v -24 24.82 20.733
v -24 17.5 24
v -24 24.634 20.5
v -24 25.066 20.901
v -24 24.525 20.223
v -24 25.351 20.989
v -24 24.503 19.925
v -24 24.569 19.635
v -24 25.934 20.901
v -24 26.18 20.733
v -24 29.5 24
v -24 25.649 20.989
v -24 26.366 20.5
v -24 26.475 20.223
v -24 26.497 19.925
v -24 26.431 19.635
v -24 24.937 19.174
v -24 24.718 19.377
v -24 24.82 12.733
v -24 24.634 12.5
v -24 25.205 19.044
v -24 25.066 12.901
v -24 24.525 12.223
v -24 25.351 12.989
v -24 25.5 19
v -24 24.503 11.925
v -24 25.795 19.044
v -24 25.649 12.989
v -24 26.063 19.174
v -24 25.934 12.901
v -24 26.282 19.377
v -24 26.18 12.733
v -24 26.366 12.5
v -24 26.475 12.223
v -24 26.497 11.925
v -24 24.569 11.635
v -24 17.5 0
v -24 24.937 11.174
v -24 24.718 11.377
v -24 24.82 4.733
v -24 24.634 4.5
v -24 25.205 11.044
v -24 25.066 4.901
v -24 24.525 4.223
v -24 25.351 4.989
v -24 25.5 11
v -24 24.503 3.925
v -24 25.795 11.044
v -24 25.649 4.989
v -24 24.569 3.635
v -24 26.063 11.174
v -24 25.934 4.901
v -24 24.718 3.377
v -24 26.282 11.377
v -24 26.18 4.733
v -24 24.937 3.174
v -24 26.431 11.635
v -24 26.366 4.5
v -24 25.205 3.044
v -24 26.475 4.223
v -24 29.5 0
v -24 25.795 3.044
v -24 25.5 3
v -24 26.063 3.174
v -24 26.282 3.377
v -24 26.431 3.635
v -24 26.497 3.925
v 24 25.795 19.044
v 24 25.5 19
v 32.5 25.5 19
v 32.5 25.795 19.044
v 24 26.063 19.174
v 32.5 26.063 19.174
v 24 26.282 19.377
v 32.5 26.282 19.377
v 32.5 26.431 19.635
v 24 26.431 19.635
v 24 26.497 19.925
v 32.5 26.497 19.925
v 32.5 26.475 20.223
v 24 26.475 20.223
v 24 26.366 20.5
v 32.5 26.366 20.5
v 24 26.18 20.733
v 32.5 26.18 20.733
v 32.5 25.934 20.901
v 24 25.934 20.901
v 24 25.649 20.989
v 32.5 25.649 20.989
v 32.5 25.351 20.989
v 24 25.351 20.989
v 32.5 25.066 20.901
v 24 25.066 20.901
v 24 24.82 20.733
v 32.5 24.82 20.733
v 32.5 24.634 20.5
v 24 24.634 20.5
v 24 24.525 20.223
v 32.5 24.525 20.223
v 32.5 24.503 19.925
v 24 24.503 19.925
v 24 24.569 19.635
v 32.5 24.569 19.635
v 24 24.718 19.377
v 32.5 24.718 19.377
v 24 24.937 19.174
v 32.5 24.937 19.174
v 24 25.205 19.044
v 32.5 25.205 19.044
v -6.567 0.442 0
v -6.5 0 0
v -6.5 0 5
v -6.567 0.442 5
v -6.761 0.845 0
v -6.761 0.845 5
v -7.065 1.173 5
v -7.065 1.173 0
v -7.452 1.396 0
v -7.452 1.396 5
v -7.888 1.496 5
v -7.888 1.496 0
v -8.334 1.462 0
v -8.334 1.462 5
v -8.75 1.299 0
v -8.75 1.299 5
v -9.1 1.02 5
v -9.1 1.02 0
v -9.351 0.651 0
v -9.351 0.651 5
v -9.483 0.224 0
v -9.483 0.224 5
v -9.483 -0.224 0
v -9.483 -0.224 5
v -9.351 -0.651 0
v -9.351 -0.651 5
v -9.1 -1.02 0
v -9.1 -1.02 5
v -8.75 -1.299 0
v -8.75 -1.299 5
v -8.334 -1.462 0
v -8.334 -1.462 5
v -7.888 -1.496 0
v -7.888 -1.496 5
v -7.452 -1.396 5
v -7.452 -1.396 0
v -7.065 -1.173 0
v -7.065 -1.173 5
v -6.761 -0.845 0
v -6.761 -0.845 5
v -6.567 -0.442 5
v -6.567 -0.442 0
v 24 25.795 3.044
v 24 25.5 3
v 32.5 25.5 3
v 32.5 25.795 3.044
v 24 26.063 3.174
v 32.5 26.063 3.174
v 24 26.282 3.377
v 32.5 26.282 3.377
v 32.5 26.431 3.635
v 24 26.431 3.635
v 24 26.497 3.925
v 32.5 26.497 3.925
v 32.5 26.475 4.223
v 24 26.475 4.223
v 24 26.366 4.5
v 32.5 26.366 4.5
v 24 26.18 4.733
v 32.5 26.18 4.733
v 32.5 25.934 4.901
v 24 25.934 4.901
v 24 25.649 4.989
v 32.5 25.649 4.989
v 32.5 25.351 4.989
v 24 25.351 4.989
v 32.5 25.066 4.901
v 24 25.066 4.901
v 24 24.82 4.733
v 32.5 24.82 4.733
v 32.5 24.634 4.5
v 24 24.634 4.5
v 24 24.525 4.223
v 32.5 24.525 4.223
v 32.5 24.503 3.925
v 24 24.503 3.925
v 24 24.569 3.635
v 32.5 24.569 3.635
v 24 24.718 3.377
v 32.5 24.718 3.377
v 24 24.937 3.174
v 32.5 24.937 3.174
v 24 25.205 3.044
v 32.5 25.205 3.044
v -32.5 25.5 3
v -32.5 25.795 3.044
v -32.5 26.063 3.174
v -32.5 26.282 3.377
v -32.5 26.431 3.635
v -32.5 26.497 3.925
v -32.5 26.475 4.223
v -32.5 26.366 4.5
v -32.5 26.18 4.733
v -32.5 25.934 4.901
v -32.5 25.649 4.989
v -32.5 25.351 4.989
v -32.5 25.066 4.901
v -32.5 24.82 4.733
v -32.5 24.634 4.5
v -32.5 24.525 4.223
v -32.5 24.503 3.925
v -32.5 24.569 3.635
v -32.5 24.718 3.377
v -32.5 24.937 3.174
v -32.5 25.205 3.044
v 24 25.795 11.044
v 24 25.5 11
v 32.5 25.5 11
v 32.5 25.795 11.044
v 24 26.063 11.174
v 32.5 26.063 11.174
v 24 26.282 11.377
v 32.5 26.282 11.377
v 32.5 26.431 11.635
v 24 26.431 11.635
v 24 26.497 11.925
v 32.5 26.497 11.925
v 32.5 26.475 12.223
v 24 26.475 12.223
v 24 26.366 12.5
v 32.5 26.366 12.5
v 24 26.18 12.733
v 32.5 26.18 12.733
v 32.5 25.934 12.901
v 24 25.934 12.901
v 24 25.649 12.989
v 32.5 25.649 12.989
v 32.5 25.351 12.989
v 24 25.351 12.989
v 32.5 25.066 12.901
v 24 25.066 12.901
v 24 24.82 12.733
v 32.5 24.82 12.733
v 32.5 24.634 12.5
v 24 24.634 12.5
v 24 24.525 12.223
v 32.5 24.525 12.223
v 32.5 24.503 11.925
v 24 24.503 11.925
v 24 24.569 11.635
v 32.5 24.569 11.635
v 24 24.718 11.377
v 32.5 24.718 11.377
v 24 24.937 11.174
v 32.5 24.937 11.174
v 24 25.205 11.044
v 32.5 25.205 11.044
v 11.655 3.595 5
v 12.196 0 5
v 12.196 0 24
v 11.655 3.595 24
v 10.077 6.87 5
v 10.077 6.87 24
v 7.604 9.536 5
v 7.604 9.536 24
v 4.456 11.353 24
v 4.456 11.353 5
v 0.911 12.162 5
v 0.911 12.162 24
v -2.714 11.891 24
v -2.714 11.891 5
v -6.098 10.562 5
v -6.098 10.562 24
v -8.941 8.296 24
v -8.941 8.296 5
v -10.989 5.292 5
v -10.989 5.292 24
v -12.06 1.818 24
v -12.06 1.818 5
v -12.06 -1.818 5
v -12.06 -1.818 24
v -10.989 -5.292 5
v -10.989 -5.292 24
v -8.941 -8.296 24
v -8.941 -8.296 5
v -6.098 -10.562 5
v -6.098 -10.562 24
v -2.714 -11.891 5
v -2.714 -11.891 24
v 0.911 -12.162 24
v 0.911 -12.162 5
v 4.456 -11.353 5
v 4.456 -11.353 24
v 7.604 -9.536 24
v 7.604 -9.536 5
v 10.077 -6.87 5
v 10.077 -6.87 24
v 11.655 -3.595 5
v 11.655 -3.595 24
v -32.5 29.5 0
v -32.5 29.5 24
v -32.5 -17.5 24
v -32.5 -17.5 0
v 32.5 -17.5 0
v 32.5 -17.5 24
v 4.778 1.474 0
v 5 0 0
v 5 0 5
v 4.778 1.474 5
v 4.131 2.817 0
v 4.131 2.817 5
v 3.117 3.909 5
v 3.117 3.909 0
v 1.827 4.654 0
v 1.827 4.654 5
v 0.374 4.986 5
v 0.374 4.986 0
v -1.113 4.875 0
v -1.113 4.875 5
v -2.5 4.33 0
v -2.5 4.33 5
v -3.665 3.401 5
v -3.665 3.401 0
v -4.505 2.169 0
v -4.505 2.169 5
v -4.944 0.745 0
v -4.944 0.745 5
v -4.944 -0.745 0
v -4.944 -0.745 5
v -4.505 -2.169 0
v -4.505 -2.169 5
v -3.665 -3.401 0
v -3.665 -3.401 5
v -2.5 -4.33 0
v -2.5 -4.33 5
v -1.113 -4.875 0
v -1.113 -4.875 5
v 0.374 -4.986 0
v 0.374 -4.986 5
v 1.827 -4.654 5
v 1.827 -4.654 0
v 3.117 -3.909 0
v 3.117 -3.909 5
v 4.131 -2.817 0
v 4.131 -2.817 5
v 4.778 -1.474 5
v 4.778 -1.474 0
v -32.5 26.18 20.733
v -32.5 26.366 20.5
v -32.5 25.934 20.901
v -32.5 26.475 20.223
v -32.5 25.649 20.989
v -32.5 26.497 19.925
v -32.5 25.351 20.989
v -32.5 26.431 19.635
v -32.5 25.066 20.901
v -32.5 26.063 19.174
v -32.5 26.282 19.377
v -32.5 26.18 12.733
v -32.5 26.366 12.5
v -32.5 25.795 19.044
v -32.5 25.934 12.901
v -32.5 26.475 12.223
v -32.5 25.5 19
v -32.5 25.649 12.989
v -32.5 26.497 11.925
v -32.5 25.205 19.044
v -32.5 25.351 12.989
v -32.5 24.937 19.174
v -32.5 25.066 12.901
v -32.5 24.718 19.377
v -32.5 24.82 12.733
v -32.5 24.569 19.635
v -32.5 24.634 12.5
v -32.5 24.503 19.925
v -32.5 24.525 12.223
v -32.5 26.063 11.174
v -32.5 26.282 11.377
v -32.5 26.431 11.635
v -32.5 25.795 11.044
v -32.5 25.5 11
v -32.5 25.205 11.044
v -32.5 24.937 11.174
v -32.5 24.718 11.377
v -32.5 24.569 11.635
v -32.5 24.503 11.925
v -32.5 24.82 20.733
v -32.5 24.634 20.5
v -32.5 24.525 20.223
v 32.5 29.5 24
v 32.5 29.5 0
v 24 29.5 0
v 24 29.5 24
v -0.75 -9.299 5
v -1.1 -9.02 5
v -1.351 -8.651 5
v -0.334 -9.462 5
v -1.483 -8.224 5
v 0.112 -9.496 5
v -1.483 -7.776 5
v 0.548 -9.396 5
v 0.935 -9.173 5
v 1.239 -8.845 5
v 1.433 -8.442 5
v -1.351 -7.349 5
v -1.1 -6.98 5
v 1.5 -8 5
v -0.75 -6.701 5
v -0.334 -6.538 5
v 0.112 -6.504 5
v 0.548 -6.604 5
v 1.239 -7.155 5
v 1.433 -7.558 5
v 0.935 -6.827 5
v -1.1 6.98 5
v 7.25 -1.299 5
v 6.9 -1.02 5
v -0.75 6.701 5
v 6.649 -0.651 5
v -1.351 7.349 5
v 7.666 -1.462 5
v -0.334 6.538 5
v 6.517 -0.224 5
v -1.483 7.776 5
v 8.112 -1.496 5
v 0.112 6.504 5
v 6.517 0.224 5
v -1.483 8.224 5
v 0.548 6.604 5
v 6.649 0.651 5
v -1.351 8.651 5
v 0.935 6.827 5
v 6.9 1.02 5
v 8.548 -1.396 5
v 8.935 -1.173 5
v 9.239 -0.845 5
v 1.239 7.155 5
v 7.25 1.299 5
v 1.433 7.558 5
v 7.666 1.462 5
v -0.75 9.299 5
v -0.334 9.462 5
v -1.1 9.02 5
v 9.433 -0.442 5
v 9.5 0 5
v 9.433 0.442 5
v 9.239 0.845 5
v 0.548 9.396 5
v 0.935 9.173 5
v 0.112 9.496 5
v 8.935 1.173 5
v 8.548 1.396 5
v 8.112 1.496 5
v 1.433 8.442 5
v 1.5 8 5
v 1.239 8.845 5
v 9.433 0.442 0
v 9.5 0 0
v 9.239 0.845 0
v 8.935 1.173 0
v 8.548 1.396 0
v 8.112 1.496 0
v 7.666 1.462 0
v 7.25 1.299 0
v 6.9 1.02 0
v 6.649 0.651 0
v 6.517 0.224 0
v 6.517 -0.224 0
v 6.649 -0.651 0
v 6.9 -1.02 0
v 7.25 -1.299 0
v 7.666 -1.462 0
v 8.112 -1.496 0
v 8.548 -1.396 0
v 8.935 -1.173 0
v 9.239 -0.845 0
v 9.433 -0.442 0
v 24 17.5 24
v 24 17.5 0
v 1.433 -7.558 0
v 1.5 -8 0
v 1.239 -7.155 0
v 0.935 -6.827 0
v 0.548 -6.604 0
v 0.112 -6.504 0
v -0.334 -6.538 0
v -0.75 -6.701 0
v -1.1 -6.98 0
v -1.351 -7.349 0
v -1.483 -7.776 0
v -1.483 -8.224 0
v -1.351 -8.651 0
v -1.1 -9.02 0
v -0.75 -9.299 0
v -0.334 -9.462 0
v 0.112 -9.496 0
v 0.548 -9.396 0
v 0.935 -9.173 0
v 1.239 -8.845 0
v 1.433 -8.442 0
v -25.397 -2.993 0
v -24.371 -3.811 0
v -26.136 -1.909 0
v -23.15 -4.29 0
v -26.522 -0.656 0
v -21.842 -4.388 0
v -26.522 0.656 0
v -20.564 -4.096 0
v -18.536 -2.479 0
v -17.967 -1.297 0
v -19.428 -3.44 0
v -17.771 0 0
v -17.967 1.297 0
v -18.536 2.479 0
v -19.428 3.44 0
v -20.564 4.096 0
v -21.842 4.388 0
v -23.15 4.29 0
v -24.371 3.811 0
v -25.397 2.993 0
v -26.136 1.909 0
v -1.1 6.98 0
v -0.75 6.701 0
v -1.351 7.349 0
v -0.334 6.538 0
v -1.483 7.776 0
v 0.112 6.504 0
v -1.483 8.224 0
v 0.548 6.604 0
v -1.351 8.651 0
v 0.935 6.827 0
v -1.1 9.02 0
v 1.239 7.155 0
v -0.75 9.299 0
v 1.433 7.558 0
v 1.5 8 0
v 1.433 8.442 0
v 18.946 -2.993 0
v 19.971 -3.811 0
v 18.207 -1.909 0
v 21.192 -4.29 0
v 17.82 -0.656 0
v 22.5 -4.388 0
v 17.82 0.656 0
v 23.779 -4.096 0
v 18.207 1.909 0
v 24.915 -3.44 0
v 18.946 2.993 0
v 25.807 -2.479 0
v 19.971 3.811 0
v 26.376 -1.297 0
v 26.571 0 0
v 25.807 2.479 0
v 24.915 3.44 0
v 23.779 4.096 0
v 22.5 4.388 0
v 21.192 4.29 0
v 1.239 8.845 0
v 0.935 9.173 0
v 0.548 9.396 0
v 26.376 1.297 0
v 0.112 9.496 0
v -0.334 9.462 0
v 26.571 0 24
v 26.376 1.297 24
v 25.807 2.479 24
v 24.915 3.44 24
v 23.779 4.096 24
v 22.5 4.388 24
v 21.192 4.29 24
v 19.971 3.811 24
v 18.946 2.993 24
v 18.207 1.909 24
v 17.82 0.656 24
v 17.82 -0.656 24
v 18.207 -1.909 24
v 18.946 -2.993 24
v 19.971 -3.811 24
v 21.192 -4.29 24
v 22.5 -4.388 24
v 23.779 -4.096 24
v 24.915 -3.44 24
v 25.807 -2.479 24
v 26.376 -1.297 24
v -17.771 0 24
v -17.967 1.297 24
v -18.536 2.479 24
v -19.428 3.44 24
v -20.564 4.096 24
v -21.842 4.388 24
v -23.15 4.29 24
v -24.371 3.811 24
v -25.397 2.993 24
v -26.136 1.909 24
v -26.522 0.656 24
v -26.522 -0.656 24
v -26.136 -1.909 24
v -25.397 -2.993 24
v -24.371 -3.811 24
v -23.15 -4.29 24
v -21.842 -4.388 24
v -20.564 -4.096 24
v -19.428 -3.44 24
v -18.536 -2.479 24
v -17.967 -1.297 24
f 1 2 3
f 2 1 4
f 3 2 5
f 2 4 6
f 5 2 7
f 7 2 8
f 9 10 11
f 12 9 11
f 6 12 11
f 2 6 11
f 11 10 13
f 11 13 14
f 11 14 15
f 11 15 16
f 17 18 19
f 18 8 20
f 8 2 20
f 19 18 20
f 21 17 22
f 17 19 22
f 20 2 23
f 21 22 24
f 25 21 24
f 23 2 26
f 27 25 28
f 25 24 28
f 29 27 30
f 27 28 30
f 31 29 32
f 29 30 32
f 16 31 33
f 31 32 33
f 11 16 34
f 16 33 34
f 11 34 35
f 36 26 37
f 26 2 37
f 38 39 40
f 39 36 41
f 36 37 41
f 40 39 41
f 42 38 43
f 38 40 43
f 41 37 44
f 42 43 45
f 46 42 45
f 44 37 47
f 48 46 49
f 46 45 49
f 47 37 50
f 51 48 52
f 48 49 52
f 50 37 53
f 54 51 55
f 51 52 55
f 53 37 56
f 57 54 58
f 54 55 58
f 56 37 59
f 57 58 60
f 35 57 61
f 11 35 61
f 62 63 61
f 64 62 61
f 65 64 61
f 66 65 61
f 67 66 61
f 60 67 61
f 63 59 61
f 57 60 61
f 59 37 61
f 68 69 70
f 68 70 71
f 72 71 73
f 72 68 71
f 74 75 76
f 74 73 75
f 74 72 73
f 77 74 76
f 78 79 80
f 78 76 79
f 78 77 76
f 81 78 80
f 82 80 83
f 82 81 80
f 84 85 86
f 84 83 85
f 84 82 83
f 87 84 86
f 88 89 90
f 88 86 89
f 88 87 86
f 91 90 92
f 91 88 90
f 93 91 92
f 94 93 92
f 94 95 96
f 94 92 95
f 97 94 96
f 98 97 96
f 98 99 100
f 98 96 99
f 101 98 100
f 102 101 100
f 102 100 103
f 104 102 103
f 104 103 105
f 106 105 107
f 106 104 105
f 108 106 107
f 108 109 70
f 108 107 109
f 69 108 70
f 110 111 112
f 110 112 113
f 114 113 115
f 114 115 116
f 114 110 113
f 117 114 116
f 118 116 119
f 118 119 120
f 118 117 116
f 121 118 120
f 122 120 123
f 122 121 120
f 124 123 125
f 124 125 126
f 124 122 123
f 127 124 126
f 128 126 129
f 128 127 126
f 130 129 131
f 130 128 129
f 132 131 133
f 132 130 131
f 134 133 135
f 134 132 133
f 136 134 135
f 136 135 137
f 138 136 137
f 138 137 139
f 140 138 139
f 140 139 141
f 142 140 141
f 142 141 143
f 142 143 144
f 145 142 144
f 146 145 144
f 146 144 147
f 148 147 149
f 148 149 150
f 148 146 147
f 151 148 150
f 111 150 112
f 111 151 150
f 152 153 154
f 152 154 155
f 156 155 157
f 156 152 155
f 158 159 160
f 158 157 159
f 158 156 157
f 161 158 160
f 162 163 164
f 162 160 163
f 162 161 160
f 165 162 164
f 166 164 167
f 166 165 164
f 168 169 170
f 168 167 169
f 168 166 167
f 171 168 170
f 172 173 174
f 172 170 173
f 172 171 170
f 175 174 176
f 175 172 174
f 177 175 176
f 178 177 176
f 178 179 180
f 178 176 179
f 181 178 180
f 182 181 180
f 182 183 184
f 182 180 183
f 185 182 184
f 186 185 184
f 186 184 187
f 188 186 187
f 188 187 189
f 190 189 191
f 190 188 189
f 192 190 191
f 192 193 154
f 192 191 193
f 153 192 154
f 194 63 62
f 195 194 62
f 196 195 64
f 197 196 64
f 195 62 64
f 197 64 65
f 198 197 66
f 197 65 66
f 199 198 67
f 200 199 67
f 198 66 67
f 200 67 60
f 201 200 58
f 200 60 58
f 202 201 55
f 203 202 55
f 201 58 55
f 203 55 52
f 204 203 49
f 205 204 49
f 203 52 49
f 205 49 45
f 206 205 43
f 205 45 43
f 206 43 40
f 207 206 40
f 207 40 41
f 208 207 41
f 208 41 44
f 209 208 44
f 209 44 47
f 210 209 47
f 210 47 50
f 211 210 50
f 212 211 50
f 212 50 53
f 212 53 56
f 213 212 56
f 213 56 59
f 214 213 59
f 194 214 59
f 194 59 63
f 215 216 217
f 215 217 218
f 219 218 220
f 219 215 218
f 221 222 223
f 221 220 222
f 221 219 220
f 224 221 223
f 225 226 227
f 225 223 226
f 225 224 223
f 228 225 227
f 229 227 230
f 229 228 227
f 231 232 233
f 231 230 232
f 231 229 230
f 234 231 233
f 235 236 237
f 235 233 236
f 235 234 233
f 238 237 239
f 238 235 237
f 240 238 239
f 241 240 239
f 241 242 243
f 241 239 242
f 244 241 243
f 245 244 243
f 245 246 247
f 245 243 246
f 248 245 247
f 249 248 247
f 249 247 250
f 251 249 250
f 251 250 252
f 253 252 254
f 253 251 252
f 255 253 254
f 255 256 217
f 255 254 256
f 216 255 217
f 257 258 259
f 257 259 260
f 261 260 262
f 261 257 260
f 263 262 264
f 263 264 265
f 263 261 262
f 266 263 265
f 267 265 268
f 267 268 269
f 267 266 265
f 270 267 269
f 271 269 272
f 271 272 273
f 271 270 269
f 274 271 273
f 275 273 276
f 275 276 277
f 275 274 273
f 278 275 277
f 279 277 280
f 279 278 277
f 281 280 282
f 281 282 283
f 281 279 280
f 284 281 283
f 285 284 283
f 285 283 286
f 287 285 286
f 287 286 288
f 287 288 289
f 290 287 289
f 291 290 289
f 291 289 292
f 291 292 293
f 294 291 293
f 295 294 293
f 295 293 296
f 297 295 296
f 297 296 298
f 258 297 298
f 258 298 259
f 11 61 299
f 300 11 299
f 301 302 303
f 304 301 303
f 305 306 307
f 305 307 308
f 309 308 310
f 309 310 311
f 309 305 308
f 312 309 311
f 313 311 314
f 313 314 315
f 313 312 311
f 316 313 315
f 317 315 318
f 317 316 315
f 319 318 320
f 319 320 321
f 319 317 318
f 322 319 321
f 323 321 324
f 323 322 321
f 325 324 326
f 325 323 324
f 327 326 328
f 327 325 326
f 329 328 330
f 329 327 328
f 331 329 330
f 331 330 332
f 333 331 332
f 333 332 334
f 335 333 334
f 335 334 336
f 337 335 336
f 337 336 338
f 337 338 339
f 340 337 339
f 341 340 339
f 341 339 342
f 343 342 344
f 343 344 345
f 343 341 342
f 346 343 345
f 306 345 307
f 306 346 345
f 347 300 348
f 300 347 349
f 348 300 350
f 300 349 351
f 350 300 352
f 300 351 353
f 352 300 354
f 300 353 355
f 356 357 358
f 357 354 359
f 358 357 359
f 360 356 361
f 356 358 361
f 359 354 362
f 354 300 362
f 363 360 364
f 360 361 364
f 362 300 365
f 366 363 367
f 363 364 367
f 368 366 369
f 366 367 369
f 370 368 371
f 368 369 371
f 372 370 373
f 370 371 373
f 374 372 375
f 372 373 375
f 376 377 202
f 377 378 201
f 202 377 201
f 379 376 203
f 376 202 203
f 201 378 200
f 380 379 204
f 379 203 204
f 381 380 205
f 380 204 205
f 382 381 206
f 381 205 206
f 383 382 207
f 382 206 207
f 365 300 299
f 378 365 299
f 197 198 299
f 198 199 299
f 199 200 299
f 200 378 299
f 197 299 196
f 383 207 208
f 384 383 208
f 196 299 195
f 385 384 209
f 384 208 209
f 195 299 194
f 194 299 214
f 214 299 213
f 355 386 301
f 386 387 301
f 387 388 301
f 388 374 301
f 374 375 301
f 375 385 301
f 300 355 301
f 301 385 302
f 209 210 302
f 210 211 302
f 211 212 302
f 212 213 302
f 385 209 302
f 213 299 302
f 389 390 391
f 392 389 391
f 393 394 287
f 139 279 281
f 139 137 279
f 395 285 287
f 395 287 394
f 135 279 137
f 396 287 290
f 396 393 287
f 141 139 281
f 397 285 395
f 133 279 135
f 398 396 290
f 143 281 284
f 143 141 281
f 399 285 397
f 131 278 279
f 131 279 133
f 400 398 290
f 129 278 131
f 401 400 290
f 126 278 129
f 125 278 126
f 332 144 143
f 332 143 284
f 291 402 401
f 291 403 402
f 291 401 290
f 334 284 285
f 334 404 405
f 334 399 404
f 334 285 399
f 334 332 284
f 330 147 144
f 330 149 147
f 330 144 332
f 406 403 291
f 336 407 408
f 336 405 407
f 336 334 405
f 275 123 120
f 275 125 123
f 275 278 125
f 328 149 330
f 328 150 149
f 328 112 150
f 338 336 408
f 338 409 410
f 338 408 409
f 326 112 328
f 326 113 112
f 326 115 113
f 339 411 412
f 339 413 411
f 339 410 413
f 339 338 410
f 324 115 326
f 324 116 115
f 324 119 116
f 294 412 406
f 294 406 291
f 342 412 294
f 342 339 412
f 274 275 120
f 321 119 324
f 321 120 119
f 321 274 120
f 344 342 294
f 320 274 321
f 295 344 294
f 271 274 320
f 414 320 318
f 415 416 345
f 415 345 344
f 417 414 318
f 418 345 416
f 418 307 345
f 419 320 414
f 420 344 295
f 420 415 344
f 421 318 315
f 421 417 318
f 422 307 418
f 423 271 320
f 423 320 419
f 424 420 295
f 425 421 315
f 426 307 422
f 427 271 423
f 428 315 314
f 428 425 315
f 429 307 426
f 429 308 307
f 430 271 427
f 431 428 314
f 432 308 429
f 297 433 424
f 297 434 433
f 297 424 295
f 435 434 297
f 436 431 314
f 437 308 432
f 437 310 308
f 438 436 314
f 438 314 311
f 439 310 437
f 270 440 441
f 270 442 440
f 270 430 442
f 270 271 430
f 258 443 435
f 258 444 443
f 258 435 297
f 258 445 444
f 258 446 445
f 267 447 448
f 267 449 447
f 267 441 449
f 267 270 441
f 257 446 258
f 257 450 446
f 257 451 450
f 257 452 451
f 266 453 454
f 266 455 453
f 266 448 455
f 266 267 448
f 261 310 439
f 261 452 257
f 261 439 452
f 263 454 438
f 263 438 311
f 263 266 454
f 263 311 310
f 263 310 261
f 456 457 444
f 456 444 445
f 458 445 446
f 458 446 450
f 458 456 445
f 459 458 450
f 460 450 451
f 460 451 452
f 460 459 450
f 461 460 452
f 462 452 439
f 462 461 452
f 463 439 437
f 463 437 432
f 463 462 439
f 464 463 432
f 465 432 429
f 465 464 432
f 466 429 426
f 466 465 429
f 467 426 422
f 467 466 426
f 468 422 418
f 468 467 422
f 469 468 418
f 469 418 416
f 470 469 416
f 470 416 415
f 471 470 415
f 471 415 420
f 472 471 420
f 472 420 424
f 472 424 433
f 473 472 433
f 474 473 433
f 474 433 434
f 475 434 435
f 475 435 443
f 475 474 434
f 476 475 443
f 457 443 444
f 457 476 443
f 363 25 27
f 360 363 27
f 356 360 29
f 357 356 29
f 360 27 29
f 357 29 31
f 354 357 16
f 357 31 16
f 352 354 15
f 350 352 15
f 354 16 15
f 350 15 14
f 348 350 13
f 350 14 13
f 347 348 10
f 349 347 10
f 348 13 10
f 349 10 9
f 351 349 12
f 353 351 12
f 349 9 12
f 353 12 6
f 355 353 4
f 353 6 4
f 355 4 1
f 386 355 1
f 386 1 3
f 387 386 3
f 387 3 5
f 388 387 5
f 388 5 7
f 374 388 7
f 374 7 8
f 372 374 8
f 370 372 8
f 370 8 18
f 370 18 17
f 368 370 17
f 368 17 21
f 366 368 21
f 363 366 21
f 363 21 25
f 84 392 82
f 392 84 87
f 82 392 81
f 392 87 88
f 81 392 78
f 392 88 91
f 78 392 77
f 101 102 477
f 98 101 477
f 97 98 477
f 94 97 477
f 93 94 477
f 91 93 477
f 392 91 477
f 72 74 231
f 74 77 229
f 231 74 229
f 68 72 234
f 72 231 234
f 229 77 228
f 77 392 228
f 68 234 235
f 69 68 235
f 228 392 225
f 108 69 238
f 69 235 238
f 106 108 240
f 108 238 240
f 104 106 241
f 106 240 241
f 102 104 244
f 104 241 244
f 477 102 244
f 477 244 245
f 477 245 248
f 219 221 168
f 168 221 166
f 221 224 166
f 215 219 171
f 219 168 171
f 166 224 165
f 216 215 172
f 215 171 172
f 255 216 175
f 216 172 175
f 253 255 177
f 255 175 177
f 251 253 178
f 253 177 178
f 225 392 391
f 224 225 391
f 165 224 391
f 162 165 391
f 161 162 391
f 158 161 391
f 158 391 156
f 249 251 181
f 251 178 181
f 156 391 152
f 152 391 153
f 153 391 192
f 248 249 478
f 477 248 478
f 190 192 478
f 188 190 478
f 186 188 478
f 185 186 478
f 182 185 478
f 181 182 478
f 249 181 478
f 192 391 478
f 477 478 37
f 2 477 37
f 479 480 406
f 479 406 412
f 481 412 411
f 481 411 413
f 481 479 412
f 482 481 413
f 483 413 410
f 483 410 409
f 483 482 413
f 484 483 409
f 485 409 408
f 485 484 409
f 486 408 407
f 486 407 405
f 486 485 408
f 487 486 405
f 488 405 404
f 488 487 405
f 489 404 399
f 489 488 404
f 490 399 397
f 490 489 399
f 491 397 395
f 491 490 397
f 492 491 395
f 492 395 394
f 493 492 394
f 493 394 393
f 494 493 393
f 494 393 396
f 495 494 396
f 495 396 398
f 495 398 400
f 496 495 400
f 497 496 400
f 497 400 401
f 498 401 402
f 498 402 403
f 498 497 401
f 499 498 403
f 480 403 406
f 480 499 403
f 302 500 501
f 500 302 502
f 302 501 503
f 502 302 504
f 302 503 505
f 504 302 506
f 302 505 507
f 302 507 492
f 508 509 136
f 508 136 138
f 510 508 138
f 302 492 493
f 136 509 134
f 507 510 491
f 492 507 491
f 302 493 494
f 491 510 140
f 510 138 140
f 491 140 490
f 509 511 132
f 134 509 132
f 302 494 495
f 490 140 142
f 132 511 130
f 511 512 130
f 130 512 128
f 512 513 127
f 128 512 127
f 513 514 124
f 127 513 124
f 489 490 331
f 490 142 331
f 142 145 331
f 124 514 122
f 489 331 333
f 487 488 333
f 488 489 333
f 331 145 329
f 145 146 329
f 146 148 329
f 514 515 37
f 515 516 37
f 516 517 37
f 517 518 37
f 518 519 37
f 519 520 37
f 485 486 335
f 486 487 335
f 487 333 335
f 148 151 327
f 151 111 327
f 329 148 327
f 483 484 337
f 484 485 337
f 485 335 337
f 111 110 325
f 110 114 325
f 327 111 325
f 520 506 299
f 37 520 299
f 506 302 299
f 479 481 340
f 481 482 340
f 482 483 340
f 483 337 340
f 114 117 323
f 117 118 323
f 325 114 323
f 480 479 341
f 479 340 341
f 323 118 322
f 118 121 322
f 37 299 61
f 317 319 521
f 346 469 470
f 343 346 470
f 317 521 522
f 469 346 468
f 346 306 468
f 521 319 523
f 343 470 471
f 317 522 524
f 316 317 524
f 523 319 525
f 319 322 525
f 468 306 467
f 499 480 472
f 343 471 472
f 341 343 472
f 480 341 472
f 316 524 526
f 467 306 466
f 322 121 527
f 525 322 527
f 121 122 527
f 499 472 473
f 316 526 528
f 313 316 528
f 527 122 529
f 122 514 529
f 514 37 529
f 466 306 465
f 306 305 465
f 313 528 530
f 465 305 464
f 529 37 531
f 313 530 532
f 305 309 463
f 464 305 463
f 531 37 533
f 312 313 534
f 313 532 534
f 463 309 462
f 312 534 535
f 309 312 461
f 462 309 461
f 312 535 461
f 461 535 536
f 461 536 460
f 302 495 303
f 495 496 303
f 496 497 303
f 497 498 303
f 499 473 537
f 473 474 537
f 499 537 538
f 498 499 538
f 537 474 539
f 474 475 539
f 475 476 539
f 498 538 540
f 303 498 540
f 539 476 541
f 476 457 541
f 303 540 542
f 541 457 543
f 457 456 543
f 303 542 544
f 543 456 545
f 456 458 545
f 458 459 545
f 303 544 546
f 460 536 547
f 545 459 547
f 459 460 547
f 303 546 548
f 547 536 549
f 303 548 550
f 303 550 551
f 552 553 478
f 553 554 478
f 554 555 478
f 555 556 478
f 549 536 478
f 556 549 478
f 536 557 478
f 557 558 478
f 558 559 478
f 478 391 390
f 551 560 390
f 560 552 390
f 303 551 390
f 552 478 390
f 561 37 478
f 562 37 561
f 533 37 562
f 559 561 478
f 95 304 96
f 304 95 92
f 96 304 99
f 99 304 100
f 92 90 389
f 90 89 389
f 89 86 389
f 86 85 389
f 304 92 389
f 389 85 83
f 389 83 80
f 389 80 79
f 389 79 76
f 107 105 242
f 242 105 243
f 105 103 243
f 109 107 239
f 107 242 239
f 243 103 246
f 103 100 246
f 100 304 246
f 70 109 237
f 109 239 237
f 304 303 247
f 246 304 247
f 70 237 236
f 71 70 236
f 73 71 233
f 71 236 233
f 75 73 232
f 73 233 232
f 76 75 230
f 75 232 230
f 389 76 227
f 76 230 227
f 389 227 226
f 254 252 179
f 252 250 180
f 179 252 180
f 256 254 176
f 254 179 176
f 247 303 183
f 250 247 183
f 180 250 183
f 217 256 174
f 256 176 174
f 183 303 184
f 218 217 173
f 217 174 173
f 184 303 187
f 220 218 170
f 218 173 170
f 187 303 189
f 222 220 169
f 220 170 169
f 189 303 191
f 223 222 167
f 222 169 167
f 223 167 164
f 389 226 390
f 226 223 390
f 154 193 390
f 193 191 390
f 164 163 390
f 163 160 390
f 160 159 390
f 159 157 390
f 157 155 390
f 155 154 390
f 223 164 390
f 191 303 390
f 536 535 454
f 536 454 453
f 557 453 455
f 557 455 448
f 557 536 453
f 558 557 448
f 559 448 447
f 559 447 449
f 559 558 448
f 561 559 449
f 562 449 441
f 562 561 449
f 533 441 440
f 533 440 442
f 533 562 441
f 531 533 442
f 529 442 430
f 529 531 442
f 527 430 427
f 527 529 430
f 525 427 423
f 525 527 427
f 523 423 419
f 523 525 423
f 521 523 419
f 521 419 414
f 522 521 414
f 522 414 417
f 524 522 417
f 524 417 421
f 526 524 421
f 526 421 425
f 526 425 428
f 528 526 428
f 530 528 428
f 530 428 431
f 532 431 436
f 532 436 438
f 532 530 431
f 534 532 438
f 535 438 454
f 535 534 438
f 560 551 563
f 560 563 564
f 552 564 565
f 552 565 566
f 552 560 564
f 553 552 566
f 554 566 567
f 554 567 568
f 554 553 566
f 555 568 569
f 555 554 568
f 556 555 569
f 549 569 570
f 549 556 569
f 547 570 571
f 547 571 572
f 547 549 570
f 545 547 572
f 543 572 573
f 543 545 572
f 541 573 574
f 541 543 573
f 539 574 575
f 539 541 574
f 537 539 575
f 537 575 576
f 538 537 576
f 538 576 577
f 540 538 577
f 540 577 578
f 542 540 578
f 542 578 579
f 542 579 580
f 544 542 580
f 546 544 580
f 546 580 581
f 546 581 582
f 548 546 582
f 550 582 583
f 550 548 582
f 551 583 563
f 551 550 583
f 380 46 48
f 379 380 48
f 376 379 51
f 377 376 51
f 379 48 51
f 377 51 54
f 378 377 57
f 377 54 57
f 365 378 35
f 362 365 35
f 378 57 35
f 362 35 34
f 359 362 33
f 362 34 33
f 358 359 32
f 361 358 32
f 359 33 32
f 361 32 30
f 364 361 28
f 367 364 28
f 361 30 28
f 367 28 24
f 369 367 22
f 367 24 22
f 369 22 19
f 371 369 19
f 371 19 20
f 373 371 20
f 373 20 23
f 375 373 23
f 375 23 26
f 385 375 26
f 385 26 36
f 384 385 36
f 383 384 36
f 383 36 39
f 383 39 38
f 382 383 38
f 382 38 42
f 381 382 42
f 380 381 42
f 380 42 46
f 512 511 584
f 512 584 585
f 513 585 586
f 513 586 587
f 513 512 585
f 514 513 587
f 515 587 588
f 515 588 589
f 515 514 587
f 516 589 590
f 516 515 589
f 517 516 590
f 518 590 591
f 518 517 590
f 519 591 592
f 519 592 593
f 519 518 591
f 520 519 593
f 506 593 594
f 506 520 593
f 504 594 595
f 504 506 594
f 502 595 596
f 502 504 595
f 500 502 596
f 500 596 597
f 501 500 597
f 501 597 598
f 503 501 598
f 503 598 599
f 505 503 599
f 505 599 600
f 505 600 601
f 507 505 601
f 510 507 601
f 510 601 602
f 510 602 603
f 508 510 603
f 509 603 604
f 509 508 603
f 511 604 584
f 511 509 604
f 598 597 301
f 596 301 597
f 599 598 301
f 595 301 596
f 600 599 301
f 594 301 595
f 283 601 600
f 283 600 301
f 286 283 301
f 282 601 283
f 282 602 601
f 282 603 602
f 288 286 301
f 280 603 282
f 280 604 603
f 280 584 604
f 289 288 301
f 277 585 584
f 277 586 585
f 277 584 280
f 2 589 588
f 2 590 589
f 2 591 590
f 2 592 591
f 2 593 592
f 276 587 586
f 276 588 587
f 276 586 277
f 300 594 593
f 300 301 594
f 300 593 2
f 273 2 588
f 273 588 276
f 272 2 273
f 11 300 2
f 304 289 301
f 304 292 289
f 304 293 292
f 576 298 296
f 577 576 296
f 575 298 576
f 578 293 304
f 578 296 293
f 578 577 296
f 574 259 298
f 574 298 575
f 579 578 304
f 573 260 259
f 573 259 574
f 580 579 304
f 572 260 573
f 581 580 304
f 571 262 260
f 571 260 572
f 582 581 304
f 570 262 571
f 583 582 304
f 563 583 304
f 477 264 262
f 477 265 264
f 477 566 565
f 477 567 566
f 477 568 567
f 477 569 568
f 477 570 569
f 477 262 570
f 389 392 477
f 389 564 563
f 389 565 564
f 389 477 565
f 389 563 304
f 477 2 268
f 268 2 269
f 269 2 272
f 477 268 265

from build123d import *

# Parameters (mm, degrees)
SKETCH1_R               = 4.4
SKETCH1_R_2             = 12.196440552
BOSS_EXTRUDE1_DEPTH     = 24
SKETCH1_3_R             = 12.196440552
SKETCH1_3_R_2           = 1.5
SKETCH1_3_R_3           = 5
BOSS_EXTRUDE2_DEPTH     = 5
SKETCH2_R               = 1
CUT_EXTRUDE1_DEPTH      = 33.5
CUT_EXTRUDE1_DEPTH_BACK = 33.5


with BuildPart() as part:
    # Sketch1 → Boss-Extrude1 (new body)
    with BuildSketch(Plane.XY):
        Polygon((-32.5, 29.5), (-32.5, -17.5), (32.5, -17.5), (32.5, 29.5), (24, 29.5), (24, 17.5), (-24, 17.5), (-24, 29.5), align=None)
        with Locations((22.171280209, 0)):
            Circle(SKETCH1_R, mode=Mode.SUBTRACT)
        with Locations((-22.171280209, 0)):
            Circle(SKETCH1_R, mode=Mode.SUBTRACT)
        Circle(SKETCH1_R_2, mode=Mode.SUBTRACT)
    extrude(amount=BOSS_EXTRUDE1_DEPTH)

    # Sketch1<3> → Boss-Extrude2 (add)
    with BuildSketch(Plane.XY):
        Circle(SKETCH1_3_R)
        with Locations((-8, 0)):
            Circle(SKETCH1_3_R_2, mode=Mode.SUBTRACT)
        with Locations((0, -8)):
            Circle(SKETCH1_3_R_2, mode=Mode.SUBTRACT)
        with Locations((8, 0)):
            Circle(SKETCH1_3_R_2, mode=Mode.SUBTRACT)
        with Locations((0, 8)):
            Circle(SKETCH1_3_R_2, mode=Mode.SUBTRACT)
        Circle(SKETCH1_3_R_3, mode=Mode.SUBTRACT)
    extrude(amount=BOSS_EXTRUDE2_DEPTH)

    # Sketch2 → Cut-Extrude1 (cut, two sides)
    with BuildSketch(Plane(origin=(0, 0, 0), x_dir=(0, 0, -1), z_dir=(1, 0, 0))) as cut_extrude1_sk:
        with Locations((-20, 25.5)):
            Circle(SKETCH2_R)
        with Locations((-12, 25.5)):
            Circle(SKETCH2_R)
        with Locations((-4, 25.5)):
            Circle(SKETCH2_R)
    extrude(amount=CUT_EXTRUDE1_DEPTH, mode=Mode.SUBTRACT)
    extrude(cut_extrude1_sk.sketch, amount=-CUT_EXTRUDE1_DEPTH_BACK, mode=Mode.SUBTRACT)


solid = part.part
